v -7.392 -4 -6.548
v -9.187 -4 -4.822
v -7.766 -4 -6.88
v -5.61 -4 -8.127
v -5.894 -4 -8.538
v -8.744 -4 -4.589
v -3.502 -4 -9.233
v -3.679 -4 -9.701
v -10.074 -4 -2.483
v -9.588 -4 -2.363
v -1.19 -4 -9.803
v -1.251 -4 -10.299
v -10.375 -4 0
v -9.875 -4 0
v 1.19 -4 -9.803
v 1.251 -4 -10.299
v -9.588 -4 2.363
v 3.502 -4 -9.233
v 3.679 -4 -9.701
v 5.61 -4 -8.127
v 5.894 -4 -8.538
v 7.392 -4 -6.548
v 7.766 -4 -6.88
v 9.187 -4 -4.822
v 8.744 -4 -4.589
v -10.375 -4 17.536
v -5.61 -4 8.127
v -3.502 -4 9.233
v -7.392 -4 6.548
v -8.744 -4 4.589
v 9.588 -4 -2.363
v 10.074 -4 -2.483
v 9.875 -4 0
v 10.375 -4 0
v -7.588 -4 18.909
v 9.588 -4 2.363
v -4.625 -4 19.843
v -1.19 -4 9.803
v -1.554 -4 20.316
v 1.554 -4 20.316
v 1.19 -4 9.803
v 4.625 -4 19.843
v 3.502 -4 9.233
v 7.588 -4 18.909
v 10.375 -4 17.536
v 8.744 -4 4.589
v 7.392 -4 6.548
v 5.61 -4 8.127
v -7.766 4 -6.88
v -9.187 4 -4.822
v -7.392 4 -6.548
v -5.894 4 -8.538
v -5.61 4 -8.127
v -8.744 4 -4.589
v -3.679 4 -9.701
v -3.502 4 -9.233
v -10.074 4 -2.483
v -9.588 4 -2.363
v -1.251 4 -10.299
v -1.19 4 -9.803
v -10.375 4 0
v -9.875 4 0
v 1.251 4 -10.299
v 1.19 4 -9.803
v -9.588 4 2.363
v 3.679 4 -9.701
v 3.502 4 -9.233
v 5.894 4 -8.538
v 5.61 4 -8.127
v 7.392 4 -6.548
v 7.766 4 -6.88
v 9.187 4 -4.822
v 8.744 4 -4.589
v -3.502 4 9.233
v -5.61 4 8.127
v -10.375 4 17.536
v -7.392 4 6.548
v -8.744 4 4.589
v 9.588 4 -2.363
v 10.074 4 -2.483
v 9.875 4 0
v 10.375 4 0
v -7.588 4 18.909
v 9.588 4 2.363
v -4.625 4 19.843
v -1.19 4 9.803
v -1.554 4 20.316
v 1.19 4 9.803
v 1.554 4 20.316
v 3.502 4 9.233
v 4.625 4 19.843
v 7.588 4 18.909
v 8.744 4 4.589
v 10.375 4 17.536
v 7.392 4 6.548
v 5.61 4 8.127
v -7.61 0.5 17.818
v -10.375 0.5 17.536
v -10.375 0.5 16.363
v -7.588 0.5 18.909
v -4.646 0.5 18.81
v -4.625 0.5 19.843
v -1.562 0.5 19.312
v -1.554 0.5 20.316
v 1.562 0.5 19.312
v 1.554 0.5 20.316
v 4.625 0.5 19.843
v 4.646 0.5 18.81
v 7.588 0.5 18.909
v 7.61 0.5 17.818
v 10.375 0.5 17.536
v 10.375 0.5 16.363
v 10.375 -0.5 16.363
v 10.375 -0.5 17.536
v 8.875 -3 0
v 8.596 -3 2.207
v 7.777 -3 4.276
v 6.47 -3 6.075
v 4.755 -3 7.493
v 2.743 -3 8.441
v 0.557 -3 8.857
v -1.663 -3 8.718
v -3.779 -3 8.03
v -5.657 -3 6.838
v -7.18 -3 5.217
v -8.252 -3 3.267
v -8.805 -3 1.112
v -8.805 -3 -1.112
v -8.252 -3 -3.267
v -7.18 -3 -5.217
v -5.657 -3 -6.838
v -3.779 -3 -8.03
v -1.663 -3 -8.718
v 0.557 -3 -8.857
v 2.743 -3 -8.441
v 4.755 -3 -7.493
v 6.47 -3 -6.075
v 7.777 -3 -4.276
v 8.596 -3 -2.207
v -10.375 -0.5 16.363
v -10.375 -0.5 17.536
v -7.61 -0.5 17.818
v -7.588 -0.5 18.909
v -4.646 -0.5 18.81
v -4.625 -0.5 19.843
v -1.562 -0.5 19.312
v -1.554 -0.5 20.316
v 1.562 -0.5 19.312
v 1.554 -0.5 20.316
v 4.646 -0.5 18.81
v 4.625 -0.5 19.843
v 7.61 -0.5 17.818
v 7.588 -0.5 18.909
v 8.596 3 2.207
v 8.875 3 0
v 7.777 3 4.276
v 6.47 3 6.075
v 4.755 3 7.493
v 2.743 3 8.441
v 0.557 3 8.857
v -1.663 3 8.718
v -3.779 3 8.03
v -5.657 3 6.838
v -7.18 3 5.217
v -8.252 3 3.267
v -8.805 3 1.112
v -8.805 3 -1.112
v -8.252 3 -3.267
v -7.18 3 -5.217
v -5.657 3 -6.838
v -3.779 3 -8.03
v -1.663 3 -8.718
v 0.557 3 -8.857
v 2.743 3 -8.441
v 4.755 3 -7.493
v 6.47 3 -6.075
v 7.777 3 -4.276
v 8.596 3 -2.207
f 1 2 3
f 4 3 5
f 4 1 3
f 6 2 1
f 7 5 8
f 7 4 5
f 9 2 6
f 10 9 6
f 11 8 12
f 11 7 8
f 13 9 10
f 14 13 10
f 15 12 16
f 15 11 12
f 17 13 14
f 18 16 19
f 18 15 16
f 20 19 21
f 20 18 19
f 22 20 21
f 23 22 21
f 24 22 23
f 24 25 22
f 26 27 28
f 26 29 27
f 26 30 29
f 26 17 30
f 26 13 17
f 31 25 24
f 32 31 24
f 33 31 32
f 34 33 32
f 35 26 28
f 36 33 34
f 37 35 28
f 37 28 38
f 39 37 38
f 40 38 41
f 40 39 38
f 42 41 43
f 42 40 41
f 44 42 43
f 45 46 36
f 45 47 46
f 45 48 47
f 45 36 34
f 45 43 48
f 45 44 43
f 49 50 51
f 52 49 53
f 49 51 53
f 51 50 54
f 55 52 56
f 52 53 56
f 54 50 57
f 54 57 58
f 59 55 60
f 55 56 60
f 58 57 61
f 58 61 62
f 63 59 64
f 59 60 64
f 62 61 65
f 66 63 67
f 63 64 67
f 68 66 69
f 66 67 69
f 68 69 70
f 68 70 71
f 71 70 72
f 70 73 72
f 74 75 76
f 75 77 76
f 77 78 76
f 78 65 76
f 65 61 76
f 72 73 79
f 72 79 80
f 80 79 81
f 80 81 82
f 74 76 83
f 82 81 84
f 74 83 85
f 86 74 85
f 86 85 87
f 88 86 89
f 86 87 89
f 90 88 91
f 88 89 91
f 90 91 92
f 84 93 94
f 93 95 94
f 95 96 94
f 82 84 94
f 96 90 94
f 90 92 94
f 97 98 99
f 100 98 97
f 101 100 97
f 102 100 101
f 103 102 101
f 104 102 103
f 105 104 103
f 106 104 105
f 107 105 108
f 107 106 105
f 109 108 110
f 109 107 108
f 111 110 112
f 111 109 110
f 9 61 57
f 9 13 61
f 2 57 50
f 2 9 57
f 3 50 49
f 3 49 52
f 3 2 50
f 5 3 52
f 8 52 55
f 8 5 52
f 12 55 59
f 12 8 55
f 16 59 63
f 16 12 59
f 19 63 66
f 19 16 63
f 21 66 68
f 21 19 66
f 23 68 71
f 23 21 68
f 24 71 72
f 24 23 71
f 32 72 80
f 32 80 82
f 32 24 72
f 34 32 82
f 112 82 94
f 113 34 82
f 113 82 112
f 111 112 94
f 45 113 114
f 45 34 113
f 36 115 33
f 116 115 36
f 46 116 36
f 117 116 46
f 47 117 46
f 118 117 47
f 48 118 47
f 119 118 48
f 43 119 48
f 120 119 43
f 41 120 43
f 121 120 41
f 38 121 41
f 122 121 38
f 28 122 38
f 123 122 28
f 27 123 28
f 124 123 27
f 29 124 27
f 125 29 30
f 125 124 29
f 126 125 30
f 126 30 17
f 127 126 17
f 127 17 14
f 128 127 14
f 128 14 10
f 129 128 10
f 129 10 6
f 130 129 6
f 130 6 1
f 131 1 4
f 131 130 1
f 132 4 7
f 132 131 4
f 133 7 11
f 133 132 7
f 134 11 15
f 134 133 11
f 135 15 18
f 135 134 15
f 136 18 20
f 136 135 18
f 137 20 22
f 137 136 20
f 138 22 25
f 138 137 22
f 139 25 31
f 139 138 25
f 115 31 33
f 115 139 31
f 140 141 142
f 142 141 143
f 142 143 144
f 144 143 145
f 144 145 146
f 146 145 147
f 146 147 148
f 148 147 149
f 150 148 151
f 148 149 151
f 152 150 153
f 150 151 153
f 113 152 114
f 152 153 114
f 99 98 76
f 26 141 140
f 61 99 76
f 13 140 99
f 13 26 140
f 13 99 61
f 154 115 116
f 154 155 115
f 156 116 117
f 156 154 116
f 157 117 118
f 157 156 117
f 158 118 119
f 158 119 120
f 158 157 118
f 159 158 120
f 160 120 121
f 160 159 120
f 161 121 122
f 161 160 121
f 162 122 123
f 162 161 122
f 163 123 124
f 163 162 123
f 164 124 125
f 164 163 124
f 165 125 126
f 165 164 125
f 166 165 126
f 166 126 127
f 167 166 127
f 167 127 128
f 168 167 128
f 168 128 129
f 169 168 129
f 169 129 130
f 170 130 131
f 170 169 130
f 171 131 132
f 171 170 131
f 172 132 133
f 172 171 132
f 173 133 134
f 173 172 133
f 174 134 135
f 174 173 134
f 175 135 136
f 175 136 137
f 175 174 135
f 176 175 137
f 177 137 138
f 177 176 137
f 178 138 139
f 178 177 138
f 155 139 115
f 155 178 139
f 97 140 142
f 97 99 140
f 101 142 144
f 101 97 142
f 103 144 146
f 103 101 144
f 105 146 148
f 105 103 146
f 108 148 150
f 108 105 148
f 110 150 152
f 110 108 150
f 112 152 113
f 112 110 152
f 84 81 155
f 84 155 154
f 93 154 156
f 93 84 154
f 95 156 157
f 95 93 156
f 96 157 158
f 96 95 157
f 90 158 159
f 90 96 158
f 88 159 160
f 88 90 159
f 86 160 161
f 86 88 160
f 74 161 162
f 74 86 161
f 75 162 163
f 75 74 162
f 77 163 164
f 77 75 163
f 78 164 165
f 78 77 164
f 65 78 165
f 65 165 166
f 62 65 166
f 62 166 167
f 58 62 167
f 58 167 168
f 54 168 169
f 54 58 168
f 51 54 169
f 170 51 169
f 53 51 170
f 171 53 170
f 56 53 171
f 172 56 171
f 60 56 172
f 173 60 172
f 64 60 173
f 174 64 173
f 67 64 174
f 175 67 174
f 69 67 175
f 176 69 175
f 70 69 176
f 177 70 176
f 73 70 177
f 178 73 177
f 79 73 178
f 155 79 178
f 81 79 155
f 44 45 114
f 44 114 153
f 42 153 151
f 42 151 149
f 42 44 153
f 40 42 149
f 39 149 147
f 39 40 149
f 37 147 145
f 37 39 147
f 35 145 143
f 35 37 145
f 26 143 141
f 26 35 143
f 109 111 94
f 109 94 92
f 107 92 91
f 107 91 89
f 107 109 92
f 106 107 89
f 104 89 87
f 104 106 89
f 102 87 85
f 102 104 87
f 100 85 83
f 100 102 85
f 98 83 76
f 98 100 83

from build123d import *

# Parameters (mm, degrees)
F0_R          = 8.875
F1_DEPTH      = 4
F1_DEPTH_BACK = 4
F2_SIZE       = 1
F3_DEPTH      = 4
F3_DEPTH_BACK = 4
F4_DEPTH      = 0.5
F4_DEPTH_BACK = 0.5


with BuildPart() as f1:
    # F0 (on Front) → F1 (new body, two sides)
    with BuildSketch(Plane.XZ) as f1_sk:
        with BuildLine():
            ThreePointArc((-10.375, 0), (0, -10.375), (10.375, 0))
            ThreePointArc((10.375, 0), (0, 10.375), (-10.375, 0))
        make_face()
        Circle(F0_R, mode=Mode.SUBTRACT)
    extrude(amount=F1_DEPTH)
    extrude(f1_sk.sketch, amount=-F1_DEPTH_BACK)

    # F2
    f2_edges = [f1.edges().sort_by_distance(p)[0] for p in [
        (-8.875, -4, 0),
        (-8.875, 4, 0),
    ]]
    chamfer(f2_edges, length=F2_SIZE)

    # F0 (on Front) → F3 (join, two sides)
    with BuildSketch(Plane.XZ) as f3_sk:
        with BuildLine():
            ThreePointArc((-10.375, 0), (0, 10.375), (10.375, 0))
            Line((10.375, 0), (10.375, 16.363068172))
            ThreePointArc((10.375, 16.363068172), (0, 19.375), (-10.375, 16.363068172))
            Line((-10.375, 16.363068172), (-10.375, 0))
        make_face()
        with BuildLine():
            ThreePointArc((-10.375, 16.363068172), (0, 19.375), (10.375, 16.363068172))
            Line((10.375, 16.363068172), (10.375, 17.5356779168))
            ThreePointArc((10.375, 17.5356779168), (0, 20.375), (-10.375, 17.5356779168))
            Line((-10.375, 17.5356779168), (-10.375, 16.363068172))
        make_face()
    extrude(amount=F3_DEPTH)
    extrude(f3_sk.sketch, amount=-F3_DEPTH_BACK)

    # F0 (on Front) → F4 (cut, two sides)
    with BuildSketch(Plane.XZ) as f4_sk:
        with BuildLine():
            ThreePointArc((-10.375, 16.363068172), (0, 19.375), (10.375, 16.363068172))
            Line((10.375, 16.363068172), (10.375, 17.5356779168))
            ThreePointArc((10.375, 17.5356779168), (0, 20.375), (-10.375, 17.5356779168))
            Line((-10.375, 17.5356779168), (-10.375, 16.363068172))
        make_face()
    extrude(amount=-F4_DEPTH, mode=Mode.SUBTRACT)
    extrude(f4_sk.sketch, amount=F4_DEPTH_BACK, mode=Mode.SUBTRACT)


solid = f1.part
